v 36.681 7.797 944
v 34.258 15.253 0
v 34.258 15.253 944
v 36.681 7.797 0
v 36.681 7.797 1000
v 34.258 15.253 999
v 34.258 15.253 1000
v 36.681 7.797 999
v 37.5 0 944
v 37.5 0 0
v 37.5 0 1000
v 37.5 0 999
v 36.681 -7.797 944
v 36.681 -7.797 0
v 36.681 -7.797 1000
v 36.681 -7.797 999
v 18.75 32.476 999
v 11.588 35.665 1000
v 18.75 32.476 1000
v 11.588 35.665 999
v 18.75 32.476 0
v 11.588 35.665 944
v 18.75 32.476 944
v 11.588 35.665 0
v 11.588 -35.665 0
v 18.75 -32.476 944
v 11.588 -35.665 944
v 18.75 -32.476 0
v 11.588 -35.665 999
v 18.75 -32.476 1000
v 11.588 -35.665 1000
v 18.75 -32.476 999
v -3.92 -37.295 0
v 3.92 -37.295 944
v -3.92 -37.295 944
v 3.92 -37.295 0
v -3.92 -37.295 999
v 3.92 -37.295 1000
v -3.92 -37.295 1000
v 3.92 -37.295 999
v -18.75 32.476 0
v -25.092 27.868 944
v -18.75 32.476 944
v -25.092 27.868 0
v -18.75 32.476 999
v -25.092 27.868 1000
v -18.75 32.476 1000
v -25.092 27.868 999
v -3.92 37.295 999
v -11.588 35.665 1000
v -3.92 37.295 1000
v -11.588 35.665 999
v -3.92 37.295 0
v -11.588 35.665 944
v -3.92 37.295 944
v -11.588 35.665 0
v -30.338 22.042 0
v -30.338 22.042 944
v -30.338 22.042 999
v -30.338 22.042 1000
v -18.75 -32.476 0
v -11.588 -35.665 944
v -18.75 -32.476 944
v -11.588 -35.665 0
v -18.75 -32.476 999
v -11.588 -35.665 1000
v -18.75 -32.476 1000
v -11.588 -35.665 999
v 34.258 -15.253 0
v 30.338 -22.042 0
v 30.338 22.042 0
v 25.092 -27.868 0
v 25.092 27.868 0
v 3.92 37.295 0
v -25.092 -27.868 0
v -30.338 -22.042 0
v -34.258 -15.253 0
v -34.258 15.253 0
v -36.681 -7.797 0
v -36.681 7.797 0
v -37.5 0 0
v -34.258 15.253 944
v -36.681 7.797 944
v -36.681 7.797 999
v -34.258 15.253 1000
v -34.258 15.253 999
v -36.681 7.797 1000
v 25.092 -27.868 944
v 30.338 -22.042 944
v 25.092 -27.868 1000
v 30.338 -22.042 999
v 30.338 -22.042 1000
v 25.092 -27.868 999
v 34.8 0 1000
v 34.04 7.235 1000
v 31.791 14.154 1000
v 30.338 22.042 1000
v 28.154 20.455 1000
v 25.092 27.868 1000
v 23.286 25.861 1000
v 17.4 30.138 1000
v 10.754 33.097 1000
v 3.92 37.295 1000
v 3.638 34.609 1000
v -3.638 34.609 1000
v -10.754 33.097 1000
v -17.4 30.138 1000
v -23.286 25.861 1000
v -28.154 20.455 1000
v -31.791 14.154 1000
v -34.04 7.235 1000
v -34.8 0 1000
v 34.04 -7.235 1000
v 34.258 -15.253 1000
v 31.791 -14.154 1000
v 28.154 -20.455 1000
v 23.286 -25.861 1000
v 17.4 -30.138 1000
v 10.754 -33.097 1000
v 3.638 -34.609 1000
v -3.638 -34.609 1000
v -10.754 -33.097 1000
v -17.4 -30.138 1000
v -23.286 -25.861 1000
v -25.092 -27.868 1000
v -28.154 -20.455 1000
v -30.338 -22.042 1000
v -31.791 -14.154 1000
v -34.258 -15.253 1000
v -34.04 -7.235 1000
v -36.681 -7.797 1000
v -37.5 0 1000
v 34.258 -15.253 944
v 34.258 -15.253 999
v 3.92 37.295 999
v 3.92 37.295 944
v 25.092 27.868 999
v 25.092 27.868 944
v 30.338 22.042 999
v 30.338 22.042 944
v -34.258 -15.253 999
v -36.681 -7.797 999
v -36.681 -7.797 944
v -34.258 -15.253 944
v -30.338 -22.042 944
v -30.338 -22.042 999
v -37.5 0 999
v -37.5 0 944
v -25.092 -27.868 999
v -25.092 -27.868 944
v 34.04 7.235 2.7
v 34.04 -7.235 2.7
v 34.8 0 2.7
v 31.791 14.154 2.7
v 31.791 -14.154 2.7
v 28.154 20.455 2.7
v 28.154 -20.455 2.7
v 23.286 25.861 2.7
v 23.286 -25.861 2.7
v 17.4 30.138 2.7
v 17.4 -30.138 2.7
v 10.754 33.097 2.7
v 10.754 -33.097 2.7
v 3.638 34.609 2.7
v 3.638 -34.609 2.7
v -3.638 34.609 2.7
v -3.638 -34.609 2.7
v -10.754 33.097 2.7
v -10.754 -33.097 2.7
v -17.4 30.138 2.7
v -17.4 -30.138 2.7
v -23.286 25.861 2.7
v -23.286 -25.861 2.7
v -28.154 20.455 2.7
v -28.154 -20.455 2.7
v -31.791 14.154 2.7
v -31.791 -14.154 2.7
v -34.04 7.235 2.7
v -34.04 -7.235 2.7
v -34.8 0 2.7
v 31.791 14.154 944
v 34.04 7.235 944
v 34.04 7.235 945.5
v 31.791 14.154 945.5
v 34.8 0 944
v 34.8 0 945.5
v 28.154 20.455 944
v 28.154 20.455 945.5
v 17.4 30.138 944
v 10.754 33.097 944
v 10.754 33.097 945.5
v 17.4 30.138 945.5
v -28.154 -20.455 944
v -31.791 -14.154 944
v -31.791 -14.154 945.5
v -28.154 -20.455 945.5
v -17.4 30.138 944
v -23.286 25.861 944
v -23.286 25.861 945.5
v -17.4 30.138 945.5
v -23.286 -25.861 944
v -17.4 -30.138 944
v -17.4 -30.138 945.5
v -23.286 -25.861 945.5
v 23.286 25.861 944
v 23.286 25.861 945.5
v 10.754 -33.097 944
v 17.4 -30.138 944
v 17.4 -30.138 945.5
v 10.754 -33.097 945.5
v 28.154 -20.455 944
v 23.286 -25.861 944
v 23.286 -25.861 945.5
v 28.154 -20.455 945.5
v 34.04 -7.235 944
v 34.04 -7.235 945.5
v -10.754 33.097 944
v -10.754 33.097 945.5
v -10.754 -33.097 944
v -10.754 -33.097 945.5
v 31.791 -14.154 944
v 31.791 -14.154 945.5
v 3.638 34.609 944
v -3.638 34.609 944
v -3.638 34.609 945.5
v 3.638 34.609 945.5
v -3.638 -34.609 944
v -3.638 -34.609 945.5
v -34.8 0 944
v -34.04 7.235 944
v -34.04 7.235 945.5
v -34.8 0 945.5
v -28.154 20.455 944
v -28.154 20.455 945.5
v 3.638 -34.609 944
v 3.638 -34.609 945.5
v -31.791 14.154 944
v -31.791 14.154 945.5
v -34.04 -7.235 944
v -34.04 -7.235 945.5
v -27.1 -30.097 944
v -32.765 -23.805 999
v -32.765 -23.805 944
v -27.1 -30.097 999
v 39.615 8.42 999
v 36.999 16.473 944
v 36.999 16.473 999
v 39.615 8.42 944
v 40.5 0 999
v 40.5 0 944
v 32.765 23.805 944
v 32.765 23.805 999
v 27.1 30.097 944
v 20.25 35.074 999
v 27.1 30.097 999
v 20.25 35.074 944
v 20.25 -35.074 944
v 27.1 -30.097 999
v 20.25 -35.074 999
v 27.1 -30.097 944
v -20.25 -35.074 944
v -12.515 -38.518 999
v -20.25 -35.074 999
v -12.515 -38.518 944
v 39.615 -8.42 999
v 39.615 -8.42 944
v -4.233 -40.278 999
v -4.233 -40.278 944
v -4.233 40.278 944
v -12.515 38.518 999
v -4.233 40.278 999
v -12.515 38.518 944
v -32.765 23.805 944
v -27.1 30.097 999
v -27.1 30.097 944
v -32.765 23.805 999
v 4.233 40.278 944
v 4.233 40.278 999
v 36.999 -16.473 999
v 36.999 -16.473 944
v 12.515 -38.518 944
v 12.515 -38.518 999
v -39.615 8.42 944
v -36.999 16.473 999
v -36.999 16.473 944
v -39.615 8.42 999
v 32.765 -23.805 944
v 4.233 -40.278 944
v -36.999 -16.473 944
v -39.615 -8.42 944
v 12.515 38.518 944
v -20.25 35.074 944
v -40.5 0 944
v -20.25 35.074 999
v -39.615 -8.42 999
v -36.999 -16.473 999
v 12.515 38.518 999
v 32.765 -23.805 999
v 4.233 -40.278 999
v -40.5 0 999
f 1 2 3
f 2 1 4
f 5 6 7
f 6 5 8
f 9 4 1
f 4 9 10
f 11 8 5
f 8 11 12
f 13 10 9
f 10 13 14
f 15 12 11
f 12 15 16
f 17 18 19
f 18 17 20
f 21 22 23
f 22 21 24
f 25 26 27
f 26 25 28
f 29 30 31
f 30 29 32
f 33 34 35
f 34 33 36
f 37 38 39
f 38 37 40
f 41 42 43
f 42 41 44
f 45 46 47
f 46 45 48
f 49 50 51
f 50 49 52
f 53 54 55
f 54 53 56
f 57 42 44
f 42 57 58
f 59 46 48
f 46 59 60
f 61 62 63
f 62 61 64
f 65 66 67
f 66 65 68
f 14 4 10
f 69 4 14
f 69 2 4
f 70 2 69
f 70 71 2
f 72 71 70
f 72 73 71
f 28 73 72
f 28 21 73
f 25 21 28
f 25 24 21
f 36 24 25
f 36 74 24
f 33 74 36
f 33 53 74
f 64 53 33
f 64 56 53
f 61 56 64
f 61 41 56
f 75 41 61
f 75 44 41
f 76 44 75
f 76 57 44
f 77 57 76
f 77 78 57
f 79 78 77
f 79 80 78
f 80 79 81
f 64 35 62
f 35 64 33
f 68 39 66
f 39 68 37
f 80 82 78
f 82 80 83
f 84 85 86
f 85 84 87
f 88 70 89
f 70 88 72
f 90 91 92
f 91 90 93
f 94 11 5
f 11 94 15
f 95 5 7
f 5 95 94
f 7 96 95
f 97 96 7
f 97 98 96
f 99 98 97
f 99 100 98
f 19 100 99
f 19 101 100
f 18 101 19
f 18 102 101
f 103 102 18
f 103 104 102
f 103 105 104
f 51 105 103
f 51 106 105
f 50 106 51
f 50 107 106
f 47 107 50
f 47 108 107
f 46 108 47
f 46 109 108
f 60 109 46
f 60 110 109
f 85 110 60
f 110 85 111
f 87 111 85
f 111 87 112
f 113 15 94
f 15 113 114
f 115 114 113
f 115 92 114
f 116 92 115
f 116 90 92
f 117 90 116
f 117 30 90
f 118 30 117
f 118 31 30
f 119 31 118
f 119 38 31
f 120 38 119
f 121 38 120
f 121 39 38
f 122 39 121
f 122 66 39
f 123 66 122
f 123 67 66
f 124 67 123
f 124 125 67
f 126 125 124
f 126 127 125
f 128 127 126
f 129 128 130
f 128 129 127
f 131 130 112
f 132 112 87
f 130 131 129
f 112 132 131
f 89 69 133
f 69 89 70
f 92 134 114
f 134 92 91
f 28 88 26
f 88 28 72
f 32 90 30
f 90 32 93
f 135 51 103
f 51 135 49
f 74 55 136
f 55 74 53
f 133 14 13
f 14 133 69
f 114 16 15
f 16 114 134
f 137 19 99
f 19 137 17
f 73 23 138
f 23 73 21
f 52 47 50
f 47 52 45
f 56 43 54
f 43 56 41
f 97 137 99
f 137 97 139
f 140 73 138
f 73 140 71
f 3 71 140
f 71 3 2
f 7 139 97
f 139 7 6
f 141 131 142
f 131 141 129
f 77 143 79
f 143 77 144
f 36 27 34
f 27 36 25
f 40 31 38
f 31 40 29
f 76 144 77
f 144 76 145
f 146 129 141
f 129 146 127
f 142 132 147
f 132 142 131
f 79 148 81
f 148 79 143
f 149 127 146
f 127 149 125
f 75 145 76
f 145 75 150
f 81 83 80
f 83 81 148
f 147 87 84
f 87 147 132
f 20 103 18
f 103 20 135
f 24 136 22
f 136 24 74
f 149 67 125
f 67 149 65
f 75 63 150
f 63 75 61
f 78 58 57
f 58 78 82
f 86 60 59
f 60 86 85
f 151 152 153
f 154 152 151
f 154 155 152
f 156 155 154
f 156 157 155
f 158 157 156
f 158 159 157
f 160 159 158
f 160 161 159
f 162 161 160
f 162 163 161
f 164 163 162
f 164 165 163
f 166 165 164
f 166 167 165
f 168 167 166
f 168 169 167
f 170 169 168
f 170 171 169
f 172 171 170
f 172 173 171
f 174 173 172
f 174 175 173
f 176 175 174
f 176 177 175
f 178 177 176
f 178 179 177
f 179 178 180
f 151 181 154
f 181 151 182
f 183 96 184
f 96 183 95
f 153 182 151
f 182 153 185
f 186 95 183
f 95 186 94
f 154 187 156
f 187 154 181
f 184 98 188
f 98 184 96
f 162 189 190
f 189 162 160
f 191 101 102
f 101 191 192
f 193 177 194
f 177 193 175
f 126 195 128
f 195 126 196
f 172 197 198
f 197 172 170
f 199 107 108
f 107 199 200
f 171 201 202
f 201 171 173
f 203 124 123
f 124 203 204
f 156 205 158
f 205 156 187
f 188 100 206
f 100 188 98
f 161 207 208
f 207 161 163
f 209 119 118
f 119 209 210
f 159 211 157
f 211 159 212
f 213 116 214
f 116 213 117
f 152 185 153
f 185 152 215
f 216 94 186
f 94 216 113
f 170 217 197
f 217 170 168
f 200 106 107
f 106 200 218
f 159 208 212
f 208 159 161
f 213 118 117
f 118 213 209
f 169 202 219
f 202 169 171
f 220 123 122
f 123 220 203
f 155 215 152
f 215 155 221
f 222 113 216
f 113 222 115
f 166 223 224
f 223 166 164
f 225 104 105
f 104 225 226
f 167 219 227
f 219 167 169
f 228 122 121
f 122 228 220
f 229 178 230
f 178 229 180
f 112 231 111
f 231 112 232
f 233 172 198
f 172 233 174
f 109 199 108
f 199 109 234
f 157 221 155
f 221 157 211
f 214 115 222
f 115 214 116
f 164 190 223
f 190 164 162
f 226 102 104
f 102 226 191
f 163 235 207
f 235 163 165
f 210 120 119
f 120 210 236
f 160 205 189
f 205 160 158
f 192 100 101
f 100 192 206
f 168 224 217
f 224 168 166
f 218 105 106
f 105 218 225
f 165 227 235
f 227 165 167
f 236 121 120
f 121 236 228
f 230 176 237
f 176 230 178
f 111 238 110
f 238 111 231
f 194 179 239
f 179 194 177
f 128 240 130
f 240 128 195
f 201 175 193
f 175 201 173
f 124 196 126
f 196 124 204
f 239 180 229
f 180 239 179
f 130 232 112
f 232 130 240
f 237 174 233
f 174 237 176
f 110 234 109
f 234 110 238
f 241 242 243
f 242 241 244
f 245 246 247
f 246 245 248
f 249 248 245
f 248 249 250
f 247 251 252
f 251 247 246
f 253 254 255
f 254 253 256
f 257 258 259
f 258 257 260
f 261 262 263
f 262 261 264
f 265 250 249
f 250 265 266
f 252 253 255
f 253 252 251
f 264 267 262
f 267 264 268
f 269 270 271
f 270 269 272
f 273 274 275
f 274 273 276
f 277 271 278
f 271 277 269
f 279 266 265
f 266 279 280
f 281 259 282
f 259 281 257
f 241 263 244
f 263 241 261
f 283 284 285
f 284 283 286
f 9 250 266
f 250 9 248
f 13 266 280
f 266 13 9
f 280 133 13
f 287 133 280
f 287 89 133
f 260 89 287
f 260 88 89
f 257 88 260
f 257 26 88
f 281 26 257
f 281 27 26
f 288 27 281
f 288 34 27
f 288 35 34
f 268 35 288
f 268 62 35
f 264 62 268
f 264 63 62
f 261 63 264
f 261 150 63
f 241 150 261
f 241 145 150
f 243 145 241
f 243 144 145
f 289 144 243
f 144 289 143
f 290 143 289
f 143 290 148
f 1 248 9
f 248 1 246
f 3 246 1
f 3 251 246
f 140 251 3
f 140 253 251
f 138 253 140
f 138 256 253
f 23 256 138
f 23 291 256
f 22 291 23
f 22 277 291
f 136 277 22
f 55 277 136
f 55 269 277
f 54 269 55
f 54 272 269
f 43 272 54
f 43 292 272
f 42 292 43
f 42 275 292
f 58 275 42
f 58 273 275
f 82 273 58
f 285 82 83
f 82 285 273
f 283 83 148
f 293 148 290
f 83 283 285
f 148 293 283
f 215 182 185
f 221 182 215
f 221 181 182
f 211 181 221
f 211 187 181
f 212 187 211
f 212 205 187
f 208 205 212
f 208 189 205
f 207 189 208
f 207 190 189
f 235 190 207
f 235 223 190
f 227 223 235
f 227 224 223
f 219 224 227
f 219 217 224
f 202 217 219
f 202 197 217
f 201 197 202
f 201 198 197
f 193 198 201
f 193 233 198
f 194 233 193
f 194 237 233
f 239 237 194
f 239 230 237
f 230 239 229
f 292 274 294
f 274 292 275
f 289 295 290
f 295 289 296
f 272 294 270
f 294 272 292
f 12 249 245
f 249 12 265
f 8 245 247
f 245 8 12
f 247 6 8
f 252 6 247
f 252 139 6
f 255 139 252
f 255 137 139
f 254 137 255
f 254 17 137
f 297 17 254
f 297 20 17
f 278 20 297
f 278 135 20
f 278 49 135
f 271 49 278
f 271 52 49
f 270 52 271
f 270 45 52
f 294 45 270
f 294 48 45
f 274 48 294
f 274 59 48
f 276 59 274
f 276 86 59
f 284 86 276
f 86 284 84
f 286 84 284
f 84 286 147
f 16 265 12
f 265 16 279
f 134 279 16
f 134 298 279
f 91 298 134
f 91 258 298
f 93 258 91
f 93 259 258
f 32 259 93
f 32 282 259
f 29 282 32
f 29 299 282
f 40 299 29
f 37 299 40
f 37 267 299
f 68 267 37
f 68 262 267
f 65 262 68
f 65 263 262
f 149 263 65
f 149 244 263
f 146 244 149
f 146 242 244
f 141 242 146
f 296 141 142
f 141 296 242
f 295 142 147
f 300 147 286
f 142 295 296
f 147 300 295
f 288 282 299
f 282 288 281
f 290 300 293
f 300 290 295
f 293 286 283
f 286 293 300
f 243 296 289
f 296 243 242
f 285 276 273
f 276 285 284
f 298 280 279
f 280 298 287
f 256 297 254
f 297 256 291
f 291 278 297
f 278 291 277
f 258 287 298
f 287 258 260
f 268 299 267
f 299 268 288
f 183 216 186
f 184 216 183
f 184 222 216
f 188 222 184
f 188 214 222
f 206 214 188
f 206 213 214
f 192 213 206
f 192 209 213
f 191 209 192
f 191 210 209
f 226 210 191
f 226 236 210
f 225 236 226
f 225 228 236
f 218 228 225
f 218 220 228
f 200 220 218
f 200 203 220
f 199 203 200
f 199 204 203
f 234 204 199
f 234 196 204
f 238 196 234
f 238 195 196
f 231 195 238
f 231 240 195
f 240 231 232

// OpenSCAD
// Parameters
pipe_standard = 1; //[1:1:1]
nominal_size = 75; //[40:150:1]
length_mm = 1000; //[500:2000:10]
include_end_fitting = 1; //[0:1:1]
od_mm = 75; //[40:150:1]
wall_thickness_mm = 2.7; //[1.5:5.4:0.1]
overlap_mm = 1; //[0.5:2:0.1]
fitting_length_mm = 55; //[30:110:1]
fitting_od_extra_mm = 6; //[2:15:0.5]
fitting_wall_extra_mm = 1.5; //[0.5:4:0.1]
fitting_stop_thickness_mm = 3; //[1:8:0.5]
fitting_stop_length_mm = 8; //[3:20:1]

// HT Pipe - complete geometry
module ht_pipe() {
  color([0.85, 0.85, 0.8]) { // PVC color
    // Main pipe body
    difference() {
      cylinder(h=length_mm, r=od_mm/2, center=false);
      translate([0, 0, wall_thickness_mm])
        cylinder(h=length_mm, r=od_mm/2 - wall_thickness_mm, center=false);
    }
    
    if (include_end_fitting) {
      // End fitting shell
      difference() {
        translate([0, 0, length_mm - fitting_length_mm - overlap_mm])
          cylinder(h=fitting_length_mm, r=od_mm/2 + fitting_od_extra_mm/2, center=false);
        translate([0, 0, length_mm - fitting_length_mm - overlap_mm + fitting_wall_extra_mm])
          cylinder(h=fitting_length_mm, r=od_mm/2 - wall_thickness_mm, center=false);
      }
      
      // Fitting stop ring
      difference() {
        translate([0, 0, length_mm - fitting_stop_length_mm - overlap_mm])
          cylinder(h=fitting_stop_length_mm, r=od_mm/2 - wall_thickness_mm + fitting_stop_thickness_mm, center=false);
        translate([0, 0, length_mm - fitting_stop_length_mm - overlap_mm])
          cylinder(h=fitting_stop_length_mm, r=od_mm/2 - wall_thickness_mm, center=false);
      }
    }
  }
}

// Assembly
module assembly() {
  ht_pipe();
}

assembly();
